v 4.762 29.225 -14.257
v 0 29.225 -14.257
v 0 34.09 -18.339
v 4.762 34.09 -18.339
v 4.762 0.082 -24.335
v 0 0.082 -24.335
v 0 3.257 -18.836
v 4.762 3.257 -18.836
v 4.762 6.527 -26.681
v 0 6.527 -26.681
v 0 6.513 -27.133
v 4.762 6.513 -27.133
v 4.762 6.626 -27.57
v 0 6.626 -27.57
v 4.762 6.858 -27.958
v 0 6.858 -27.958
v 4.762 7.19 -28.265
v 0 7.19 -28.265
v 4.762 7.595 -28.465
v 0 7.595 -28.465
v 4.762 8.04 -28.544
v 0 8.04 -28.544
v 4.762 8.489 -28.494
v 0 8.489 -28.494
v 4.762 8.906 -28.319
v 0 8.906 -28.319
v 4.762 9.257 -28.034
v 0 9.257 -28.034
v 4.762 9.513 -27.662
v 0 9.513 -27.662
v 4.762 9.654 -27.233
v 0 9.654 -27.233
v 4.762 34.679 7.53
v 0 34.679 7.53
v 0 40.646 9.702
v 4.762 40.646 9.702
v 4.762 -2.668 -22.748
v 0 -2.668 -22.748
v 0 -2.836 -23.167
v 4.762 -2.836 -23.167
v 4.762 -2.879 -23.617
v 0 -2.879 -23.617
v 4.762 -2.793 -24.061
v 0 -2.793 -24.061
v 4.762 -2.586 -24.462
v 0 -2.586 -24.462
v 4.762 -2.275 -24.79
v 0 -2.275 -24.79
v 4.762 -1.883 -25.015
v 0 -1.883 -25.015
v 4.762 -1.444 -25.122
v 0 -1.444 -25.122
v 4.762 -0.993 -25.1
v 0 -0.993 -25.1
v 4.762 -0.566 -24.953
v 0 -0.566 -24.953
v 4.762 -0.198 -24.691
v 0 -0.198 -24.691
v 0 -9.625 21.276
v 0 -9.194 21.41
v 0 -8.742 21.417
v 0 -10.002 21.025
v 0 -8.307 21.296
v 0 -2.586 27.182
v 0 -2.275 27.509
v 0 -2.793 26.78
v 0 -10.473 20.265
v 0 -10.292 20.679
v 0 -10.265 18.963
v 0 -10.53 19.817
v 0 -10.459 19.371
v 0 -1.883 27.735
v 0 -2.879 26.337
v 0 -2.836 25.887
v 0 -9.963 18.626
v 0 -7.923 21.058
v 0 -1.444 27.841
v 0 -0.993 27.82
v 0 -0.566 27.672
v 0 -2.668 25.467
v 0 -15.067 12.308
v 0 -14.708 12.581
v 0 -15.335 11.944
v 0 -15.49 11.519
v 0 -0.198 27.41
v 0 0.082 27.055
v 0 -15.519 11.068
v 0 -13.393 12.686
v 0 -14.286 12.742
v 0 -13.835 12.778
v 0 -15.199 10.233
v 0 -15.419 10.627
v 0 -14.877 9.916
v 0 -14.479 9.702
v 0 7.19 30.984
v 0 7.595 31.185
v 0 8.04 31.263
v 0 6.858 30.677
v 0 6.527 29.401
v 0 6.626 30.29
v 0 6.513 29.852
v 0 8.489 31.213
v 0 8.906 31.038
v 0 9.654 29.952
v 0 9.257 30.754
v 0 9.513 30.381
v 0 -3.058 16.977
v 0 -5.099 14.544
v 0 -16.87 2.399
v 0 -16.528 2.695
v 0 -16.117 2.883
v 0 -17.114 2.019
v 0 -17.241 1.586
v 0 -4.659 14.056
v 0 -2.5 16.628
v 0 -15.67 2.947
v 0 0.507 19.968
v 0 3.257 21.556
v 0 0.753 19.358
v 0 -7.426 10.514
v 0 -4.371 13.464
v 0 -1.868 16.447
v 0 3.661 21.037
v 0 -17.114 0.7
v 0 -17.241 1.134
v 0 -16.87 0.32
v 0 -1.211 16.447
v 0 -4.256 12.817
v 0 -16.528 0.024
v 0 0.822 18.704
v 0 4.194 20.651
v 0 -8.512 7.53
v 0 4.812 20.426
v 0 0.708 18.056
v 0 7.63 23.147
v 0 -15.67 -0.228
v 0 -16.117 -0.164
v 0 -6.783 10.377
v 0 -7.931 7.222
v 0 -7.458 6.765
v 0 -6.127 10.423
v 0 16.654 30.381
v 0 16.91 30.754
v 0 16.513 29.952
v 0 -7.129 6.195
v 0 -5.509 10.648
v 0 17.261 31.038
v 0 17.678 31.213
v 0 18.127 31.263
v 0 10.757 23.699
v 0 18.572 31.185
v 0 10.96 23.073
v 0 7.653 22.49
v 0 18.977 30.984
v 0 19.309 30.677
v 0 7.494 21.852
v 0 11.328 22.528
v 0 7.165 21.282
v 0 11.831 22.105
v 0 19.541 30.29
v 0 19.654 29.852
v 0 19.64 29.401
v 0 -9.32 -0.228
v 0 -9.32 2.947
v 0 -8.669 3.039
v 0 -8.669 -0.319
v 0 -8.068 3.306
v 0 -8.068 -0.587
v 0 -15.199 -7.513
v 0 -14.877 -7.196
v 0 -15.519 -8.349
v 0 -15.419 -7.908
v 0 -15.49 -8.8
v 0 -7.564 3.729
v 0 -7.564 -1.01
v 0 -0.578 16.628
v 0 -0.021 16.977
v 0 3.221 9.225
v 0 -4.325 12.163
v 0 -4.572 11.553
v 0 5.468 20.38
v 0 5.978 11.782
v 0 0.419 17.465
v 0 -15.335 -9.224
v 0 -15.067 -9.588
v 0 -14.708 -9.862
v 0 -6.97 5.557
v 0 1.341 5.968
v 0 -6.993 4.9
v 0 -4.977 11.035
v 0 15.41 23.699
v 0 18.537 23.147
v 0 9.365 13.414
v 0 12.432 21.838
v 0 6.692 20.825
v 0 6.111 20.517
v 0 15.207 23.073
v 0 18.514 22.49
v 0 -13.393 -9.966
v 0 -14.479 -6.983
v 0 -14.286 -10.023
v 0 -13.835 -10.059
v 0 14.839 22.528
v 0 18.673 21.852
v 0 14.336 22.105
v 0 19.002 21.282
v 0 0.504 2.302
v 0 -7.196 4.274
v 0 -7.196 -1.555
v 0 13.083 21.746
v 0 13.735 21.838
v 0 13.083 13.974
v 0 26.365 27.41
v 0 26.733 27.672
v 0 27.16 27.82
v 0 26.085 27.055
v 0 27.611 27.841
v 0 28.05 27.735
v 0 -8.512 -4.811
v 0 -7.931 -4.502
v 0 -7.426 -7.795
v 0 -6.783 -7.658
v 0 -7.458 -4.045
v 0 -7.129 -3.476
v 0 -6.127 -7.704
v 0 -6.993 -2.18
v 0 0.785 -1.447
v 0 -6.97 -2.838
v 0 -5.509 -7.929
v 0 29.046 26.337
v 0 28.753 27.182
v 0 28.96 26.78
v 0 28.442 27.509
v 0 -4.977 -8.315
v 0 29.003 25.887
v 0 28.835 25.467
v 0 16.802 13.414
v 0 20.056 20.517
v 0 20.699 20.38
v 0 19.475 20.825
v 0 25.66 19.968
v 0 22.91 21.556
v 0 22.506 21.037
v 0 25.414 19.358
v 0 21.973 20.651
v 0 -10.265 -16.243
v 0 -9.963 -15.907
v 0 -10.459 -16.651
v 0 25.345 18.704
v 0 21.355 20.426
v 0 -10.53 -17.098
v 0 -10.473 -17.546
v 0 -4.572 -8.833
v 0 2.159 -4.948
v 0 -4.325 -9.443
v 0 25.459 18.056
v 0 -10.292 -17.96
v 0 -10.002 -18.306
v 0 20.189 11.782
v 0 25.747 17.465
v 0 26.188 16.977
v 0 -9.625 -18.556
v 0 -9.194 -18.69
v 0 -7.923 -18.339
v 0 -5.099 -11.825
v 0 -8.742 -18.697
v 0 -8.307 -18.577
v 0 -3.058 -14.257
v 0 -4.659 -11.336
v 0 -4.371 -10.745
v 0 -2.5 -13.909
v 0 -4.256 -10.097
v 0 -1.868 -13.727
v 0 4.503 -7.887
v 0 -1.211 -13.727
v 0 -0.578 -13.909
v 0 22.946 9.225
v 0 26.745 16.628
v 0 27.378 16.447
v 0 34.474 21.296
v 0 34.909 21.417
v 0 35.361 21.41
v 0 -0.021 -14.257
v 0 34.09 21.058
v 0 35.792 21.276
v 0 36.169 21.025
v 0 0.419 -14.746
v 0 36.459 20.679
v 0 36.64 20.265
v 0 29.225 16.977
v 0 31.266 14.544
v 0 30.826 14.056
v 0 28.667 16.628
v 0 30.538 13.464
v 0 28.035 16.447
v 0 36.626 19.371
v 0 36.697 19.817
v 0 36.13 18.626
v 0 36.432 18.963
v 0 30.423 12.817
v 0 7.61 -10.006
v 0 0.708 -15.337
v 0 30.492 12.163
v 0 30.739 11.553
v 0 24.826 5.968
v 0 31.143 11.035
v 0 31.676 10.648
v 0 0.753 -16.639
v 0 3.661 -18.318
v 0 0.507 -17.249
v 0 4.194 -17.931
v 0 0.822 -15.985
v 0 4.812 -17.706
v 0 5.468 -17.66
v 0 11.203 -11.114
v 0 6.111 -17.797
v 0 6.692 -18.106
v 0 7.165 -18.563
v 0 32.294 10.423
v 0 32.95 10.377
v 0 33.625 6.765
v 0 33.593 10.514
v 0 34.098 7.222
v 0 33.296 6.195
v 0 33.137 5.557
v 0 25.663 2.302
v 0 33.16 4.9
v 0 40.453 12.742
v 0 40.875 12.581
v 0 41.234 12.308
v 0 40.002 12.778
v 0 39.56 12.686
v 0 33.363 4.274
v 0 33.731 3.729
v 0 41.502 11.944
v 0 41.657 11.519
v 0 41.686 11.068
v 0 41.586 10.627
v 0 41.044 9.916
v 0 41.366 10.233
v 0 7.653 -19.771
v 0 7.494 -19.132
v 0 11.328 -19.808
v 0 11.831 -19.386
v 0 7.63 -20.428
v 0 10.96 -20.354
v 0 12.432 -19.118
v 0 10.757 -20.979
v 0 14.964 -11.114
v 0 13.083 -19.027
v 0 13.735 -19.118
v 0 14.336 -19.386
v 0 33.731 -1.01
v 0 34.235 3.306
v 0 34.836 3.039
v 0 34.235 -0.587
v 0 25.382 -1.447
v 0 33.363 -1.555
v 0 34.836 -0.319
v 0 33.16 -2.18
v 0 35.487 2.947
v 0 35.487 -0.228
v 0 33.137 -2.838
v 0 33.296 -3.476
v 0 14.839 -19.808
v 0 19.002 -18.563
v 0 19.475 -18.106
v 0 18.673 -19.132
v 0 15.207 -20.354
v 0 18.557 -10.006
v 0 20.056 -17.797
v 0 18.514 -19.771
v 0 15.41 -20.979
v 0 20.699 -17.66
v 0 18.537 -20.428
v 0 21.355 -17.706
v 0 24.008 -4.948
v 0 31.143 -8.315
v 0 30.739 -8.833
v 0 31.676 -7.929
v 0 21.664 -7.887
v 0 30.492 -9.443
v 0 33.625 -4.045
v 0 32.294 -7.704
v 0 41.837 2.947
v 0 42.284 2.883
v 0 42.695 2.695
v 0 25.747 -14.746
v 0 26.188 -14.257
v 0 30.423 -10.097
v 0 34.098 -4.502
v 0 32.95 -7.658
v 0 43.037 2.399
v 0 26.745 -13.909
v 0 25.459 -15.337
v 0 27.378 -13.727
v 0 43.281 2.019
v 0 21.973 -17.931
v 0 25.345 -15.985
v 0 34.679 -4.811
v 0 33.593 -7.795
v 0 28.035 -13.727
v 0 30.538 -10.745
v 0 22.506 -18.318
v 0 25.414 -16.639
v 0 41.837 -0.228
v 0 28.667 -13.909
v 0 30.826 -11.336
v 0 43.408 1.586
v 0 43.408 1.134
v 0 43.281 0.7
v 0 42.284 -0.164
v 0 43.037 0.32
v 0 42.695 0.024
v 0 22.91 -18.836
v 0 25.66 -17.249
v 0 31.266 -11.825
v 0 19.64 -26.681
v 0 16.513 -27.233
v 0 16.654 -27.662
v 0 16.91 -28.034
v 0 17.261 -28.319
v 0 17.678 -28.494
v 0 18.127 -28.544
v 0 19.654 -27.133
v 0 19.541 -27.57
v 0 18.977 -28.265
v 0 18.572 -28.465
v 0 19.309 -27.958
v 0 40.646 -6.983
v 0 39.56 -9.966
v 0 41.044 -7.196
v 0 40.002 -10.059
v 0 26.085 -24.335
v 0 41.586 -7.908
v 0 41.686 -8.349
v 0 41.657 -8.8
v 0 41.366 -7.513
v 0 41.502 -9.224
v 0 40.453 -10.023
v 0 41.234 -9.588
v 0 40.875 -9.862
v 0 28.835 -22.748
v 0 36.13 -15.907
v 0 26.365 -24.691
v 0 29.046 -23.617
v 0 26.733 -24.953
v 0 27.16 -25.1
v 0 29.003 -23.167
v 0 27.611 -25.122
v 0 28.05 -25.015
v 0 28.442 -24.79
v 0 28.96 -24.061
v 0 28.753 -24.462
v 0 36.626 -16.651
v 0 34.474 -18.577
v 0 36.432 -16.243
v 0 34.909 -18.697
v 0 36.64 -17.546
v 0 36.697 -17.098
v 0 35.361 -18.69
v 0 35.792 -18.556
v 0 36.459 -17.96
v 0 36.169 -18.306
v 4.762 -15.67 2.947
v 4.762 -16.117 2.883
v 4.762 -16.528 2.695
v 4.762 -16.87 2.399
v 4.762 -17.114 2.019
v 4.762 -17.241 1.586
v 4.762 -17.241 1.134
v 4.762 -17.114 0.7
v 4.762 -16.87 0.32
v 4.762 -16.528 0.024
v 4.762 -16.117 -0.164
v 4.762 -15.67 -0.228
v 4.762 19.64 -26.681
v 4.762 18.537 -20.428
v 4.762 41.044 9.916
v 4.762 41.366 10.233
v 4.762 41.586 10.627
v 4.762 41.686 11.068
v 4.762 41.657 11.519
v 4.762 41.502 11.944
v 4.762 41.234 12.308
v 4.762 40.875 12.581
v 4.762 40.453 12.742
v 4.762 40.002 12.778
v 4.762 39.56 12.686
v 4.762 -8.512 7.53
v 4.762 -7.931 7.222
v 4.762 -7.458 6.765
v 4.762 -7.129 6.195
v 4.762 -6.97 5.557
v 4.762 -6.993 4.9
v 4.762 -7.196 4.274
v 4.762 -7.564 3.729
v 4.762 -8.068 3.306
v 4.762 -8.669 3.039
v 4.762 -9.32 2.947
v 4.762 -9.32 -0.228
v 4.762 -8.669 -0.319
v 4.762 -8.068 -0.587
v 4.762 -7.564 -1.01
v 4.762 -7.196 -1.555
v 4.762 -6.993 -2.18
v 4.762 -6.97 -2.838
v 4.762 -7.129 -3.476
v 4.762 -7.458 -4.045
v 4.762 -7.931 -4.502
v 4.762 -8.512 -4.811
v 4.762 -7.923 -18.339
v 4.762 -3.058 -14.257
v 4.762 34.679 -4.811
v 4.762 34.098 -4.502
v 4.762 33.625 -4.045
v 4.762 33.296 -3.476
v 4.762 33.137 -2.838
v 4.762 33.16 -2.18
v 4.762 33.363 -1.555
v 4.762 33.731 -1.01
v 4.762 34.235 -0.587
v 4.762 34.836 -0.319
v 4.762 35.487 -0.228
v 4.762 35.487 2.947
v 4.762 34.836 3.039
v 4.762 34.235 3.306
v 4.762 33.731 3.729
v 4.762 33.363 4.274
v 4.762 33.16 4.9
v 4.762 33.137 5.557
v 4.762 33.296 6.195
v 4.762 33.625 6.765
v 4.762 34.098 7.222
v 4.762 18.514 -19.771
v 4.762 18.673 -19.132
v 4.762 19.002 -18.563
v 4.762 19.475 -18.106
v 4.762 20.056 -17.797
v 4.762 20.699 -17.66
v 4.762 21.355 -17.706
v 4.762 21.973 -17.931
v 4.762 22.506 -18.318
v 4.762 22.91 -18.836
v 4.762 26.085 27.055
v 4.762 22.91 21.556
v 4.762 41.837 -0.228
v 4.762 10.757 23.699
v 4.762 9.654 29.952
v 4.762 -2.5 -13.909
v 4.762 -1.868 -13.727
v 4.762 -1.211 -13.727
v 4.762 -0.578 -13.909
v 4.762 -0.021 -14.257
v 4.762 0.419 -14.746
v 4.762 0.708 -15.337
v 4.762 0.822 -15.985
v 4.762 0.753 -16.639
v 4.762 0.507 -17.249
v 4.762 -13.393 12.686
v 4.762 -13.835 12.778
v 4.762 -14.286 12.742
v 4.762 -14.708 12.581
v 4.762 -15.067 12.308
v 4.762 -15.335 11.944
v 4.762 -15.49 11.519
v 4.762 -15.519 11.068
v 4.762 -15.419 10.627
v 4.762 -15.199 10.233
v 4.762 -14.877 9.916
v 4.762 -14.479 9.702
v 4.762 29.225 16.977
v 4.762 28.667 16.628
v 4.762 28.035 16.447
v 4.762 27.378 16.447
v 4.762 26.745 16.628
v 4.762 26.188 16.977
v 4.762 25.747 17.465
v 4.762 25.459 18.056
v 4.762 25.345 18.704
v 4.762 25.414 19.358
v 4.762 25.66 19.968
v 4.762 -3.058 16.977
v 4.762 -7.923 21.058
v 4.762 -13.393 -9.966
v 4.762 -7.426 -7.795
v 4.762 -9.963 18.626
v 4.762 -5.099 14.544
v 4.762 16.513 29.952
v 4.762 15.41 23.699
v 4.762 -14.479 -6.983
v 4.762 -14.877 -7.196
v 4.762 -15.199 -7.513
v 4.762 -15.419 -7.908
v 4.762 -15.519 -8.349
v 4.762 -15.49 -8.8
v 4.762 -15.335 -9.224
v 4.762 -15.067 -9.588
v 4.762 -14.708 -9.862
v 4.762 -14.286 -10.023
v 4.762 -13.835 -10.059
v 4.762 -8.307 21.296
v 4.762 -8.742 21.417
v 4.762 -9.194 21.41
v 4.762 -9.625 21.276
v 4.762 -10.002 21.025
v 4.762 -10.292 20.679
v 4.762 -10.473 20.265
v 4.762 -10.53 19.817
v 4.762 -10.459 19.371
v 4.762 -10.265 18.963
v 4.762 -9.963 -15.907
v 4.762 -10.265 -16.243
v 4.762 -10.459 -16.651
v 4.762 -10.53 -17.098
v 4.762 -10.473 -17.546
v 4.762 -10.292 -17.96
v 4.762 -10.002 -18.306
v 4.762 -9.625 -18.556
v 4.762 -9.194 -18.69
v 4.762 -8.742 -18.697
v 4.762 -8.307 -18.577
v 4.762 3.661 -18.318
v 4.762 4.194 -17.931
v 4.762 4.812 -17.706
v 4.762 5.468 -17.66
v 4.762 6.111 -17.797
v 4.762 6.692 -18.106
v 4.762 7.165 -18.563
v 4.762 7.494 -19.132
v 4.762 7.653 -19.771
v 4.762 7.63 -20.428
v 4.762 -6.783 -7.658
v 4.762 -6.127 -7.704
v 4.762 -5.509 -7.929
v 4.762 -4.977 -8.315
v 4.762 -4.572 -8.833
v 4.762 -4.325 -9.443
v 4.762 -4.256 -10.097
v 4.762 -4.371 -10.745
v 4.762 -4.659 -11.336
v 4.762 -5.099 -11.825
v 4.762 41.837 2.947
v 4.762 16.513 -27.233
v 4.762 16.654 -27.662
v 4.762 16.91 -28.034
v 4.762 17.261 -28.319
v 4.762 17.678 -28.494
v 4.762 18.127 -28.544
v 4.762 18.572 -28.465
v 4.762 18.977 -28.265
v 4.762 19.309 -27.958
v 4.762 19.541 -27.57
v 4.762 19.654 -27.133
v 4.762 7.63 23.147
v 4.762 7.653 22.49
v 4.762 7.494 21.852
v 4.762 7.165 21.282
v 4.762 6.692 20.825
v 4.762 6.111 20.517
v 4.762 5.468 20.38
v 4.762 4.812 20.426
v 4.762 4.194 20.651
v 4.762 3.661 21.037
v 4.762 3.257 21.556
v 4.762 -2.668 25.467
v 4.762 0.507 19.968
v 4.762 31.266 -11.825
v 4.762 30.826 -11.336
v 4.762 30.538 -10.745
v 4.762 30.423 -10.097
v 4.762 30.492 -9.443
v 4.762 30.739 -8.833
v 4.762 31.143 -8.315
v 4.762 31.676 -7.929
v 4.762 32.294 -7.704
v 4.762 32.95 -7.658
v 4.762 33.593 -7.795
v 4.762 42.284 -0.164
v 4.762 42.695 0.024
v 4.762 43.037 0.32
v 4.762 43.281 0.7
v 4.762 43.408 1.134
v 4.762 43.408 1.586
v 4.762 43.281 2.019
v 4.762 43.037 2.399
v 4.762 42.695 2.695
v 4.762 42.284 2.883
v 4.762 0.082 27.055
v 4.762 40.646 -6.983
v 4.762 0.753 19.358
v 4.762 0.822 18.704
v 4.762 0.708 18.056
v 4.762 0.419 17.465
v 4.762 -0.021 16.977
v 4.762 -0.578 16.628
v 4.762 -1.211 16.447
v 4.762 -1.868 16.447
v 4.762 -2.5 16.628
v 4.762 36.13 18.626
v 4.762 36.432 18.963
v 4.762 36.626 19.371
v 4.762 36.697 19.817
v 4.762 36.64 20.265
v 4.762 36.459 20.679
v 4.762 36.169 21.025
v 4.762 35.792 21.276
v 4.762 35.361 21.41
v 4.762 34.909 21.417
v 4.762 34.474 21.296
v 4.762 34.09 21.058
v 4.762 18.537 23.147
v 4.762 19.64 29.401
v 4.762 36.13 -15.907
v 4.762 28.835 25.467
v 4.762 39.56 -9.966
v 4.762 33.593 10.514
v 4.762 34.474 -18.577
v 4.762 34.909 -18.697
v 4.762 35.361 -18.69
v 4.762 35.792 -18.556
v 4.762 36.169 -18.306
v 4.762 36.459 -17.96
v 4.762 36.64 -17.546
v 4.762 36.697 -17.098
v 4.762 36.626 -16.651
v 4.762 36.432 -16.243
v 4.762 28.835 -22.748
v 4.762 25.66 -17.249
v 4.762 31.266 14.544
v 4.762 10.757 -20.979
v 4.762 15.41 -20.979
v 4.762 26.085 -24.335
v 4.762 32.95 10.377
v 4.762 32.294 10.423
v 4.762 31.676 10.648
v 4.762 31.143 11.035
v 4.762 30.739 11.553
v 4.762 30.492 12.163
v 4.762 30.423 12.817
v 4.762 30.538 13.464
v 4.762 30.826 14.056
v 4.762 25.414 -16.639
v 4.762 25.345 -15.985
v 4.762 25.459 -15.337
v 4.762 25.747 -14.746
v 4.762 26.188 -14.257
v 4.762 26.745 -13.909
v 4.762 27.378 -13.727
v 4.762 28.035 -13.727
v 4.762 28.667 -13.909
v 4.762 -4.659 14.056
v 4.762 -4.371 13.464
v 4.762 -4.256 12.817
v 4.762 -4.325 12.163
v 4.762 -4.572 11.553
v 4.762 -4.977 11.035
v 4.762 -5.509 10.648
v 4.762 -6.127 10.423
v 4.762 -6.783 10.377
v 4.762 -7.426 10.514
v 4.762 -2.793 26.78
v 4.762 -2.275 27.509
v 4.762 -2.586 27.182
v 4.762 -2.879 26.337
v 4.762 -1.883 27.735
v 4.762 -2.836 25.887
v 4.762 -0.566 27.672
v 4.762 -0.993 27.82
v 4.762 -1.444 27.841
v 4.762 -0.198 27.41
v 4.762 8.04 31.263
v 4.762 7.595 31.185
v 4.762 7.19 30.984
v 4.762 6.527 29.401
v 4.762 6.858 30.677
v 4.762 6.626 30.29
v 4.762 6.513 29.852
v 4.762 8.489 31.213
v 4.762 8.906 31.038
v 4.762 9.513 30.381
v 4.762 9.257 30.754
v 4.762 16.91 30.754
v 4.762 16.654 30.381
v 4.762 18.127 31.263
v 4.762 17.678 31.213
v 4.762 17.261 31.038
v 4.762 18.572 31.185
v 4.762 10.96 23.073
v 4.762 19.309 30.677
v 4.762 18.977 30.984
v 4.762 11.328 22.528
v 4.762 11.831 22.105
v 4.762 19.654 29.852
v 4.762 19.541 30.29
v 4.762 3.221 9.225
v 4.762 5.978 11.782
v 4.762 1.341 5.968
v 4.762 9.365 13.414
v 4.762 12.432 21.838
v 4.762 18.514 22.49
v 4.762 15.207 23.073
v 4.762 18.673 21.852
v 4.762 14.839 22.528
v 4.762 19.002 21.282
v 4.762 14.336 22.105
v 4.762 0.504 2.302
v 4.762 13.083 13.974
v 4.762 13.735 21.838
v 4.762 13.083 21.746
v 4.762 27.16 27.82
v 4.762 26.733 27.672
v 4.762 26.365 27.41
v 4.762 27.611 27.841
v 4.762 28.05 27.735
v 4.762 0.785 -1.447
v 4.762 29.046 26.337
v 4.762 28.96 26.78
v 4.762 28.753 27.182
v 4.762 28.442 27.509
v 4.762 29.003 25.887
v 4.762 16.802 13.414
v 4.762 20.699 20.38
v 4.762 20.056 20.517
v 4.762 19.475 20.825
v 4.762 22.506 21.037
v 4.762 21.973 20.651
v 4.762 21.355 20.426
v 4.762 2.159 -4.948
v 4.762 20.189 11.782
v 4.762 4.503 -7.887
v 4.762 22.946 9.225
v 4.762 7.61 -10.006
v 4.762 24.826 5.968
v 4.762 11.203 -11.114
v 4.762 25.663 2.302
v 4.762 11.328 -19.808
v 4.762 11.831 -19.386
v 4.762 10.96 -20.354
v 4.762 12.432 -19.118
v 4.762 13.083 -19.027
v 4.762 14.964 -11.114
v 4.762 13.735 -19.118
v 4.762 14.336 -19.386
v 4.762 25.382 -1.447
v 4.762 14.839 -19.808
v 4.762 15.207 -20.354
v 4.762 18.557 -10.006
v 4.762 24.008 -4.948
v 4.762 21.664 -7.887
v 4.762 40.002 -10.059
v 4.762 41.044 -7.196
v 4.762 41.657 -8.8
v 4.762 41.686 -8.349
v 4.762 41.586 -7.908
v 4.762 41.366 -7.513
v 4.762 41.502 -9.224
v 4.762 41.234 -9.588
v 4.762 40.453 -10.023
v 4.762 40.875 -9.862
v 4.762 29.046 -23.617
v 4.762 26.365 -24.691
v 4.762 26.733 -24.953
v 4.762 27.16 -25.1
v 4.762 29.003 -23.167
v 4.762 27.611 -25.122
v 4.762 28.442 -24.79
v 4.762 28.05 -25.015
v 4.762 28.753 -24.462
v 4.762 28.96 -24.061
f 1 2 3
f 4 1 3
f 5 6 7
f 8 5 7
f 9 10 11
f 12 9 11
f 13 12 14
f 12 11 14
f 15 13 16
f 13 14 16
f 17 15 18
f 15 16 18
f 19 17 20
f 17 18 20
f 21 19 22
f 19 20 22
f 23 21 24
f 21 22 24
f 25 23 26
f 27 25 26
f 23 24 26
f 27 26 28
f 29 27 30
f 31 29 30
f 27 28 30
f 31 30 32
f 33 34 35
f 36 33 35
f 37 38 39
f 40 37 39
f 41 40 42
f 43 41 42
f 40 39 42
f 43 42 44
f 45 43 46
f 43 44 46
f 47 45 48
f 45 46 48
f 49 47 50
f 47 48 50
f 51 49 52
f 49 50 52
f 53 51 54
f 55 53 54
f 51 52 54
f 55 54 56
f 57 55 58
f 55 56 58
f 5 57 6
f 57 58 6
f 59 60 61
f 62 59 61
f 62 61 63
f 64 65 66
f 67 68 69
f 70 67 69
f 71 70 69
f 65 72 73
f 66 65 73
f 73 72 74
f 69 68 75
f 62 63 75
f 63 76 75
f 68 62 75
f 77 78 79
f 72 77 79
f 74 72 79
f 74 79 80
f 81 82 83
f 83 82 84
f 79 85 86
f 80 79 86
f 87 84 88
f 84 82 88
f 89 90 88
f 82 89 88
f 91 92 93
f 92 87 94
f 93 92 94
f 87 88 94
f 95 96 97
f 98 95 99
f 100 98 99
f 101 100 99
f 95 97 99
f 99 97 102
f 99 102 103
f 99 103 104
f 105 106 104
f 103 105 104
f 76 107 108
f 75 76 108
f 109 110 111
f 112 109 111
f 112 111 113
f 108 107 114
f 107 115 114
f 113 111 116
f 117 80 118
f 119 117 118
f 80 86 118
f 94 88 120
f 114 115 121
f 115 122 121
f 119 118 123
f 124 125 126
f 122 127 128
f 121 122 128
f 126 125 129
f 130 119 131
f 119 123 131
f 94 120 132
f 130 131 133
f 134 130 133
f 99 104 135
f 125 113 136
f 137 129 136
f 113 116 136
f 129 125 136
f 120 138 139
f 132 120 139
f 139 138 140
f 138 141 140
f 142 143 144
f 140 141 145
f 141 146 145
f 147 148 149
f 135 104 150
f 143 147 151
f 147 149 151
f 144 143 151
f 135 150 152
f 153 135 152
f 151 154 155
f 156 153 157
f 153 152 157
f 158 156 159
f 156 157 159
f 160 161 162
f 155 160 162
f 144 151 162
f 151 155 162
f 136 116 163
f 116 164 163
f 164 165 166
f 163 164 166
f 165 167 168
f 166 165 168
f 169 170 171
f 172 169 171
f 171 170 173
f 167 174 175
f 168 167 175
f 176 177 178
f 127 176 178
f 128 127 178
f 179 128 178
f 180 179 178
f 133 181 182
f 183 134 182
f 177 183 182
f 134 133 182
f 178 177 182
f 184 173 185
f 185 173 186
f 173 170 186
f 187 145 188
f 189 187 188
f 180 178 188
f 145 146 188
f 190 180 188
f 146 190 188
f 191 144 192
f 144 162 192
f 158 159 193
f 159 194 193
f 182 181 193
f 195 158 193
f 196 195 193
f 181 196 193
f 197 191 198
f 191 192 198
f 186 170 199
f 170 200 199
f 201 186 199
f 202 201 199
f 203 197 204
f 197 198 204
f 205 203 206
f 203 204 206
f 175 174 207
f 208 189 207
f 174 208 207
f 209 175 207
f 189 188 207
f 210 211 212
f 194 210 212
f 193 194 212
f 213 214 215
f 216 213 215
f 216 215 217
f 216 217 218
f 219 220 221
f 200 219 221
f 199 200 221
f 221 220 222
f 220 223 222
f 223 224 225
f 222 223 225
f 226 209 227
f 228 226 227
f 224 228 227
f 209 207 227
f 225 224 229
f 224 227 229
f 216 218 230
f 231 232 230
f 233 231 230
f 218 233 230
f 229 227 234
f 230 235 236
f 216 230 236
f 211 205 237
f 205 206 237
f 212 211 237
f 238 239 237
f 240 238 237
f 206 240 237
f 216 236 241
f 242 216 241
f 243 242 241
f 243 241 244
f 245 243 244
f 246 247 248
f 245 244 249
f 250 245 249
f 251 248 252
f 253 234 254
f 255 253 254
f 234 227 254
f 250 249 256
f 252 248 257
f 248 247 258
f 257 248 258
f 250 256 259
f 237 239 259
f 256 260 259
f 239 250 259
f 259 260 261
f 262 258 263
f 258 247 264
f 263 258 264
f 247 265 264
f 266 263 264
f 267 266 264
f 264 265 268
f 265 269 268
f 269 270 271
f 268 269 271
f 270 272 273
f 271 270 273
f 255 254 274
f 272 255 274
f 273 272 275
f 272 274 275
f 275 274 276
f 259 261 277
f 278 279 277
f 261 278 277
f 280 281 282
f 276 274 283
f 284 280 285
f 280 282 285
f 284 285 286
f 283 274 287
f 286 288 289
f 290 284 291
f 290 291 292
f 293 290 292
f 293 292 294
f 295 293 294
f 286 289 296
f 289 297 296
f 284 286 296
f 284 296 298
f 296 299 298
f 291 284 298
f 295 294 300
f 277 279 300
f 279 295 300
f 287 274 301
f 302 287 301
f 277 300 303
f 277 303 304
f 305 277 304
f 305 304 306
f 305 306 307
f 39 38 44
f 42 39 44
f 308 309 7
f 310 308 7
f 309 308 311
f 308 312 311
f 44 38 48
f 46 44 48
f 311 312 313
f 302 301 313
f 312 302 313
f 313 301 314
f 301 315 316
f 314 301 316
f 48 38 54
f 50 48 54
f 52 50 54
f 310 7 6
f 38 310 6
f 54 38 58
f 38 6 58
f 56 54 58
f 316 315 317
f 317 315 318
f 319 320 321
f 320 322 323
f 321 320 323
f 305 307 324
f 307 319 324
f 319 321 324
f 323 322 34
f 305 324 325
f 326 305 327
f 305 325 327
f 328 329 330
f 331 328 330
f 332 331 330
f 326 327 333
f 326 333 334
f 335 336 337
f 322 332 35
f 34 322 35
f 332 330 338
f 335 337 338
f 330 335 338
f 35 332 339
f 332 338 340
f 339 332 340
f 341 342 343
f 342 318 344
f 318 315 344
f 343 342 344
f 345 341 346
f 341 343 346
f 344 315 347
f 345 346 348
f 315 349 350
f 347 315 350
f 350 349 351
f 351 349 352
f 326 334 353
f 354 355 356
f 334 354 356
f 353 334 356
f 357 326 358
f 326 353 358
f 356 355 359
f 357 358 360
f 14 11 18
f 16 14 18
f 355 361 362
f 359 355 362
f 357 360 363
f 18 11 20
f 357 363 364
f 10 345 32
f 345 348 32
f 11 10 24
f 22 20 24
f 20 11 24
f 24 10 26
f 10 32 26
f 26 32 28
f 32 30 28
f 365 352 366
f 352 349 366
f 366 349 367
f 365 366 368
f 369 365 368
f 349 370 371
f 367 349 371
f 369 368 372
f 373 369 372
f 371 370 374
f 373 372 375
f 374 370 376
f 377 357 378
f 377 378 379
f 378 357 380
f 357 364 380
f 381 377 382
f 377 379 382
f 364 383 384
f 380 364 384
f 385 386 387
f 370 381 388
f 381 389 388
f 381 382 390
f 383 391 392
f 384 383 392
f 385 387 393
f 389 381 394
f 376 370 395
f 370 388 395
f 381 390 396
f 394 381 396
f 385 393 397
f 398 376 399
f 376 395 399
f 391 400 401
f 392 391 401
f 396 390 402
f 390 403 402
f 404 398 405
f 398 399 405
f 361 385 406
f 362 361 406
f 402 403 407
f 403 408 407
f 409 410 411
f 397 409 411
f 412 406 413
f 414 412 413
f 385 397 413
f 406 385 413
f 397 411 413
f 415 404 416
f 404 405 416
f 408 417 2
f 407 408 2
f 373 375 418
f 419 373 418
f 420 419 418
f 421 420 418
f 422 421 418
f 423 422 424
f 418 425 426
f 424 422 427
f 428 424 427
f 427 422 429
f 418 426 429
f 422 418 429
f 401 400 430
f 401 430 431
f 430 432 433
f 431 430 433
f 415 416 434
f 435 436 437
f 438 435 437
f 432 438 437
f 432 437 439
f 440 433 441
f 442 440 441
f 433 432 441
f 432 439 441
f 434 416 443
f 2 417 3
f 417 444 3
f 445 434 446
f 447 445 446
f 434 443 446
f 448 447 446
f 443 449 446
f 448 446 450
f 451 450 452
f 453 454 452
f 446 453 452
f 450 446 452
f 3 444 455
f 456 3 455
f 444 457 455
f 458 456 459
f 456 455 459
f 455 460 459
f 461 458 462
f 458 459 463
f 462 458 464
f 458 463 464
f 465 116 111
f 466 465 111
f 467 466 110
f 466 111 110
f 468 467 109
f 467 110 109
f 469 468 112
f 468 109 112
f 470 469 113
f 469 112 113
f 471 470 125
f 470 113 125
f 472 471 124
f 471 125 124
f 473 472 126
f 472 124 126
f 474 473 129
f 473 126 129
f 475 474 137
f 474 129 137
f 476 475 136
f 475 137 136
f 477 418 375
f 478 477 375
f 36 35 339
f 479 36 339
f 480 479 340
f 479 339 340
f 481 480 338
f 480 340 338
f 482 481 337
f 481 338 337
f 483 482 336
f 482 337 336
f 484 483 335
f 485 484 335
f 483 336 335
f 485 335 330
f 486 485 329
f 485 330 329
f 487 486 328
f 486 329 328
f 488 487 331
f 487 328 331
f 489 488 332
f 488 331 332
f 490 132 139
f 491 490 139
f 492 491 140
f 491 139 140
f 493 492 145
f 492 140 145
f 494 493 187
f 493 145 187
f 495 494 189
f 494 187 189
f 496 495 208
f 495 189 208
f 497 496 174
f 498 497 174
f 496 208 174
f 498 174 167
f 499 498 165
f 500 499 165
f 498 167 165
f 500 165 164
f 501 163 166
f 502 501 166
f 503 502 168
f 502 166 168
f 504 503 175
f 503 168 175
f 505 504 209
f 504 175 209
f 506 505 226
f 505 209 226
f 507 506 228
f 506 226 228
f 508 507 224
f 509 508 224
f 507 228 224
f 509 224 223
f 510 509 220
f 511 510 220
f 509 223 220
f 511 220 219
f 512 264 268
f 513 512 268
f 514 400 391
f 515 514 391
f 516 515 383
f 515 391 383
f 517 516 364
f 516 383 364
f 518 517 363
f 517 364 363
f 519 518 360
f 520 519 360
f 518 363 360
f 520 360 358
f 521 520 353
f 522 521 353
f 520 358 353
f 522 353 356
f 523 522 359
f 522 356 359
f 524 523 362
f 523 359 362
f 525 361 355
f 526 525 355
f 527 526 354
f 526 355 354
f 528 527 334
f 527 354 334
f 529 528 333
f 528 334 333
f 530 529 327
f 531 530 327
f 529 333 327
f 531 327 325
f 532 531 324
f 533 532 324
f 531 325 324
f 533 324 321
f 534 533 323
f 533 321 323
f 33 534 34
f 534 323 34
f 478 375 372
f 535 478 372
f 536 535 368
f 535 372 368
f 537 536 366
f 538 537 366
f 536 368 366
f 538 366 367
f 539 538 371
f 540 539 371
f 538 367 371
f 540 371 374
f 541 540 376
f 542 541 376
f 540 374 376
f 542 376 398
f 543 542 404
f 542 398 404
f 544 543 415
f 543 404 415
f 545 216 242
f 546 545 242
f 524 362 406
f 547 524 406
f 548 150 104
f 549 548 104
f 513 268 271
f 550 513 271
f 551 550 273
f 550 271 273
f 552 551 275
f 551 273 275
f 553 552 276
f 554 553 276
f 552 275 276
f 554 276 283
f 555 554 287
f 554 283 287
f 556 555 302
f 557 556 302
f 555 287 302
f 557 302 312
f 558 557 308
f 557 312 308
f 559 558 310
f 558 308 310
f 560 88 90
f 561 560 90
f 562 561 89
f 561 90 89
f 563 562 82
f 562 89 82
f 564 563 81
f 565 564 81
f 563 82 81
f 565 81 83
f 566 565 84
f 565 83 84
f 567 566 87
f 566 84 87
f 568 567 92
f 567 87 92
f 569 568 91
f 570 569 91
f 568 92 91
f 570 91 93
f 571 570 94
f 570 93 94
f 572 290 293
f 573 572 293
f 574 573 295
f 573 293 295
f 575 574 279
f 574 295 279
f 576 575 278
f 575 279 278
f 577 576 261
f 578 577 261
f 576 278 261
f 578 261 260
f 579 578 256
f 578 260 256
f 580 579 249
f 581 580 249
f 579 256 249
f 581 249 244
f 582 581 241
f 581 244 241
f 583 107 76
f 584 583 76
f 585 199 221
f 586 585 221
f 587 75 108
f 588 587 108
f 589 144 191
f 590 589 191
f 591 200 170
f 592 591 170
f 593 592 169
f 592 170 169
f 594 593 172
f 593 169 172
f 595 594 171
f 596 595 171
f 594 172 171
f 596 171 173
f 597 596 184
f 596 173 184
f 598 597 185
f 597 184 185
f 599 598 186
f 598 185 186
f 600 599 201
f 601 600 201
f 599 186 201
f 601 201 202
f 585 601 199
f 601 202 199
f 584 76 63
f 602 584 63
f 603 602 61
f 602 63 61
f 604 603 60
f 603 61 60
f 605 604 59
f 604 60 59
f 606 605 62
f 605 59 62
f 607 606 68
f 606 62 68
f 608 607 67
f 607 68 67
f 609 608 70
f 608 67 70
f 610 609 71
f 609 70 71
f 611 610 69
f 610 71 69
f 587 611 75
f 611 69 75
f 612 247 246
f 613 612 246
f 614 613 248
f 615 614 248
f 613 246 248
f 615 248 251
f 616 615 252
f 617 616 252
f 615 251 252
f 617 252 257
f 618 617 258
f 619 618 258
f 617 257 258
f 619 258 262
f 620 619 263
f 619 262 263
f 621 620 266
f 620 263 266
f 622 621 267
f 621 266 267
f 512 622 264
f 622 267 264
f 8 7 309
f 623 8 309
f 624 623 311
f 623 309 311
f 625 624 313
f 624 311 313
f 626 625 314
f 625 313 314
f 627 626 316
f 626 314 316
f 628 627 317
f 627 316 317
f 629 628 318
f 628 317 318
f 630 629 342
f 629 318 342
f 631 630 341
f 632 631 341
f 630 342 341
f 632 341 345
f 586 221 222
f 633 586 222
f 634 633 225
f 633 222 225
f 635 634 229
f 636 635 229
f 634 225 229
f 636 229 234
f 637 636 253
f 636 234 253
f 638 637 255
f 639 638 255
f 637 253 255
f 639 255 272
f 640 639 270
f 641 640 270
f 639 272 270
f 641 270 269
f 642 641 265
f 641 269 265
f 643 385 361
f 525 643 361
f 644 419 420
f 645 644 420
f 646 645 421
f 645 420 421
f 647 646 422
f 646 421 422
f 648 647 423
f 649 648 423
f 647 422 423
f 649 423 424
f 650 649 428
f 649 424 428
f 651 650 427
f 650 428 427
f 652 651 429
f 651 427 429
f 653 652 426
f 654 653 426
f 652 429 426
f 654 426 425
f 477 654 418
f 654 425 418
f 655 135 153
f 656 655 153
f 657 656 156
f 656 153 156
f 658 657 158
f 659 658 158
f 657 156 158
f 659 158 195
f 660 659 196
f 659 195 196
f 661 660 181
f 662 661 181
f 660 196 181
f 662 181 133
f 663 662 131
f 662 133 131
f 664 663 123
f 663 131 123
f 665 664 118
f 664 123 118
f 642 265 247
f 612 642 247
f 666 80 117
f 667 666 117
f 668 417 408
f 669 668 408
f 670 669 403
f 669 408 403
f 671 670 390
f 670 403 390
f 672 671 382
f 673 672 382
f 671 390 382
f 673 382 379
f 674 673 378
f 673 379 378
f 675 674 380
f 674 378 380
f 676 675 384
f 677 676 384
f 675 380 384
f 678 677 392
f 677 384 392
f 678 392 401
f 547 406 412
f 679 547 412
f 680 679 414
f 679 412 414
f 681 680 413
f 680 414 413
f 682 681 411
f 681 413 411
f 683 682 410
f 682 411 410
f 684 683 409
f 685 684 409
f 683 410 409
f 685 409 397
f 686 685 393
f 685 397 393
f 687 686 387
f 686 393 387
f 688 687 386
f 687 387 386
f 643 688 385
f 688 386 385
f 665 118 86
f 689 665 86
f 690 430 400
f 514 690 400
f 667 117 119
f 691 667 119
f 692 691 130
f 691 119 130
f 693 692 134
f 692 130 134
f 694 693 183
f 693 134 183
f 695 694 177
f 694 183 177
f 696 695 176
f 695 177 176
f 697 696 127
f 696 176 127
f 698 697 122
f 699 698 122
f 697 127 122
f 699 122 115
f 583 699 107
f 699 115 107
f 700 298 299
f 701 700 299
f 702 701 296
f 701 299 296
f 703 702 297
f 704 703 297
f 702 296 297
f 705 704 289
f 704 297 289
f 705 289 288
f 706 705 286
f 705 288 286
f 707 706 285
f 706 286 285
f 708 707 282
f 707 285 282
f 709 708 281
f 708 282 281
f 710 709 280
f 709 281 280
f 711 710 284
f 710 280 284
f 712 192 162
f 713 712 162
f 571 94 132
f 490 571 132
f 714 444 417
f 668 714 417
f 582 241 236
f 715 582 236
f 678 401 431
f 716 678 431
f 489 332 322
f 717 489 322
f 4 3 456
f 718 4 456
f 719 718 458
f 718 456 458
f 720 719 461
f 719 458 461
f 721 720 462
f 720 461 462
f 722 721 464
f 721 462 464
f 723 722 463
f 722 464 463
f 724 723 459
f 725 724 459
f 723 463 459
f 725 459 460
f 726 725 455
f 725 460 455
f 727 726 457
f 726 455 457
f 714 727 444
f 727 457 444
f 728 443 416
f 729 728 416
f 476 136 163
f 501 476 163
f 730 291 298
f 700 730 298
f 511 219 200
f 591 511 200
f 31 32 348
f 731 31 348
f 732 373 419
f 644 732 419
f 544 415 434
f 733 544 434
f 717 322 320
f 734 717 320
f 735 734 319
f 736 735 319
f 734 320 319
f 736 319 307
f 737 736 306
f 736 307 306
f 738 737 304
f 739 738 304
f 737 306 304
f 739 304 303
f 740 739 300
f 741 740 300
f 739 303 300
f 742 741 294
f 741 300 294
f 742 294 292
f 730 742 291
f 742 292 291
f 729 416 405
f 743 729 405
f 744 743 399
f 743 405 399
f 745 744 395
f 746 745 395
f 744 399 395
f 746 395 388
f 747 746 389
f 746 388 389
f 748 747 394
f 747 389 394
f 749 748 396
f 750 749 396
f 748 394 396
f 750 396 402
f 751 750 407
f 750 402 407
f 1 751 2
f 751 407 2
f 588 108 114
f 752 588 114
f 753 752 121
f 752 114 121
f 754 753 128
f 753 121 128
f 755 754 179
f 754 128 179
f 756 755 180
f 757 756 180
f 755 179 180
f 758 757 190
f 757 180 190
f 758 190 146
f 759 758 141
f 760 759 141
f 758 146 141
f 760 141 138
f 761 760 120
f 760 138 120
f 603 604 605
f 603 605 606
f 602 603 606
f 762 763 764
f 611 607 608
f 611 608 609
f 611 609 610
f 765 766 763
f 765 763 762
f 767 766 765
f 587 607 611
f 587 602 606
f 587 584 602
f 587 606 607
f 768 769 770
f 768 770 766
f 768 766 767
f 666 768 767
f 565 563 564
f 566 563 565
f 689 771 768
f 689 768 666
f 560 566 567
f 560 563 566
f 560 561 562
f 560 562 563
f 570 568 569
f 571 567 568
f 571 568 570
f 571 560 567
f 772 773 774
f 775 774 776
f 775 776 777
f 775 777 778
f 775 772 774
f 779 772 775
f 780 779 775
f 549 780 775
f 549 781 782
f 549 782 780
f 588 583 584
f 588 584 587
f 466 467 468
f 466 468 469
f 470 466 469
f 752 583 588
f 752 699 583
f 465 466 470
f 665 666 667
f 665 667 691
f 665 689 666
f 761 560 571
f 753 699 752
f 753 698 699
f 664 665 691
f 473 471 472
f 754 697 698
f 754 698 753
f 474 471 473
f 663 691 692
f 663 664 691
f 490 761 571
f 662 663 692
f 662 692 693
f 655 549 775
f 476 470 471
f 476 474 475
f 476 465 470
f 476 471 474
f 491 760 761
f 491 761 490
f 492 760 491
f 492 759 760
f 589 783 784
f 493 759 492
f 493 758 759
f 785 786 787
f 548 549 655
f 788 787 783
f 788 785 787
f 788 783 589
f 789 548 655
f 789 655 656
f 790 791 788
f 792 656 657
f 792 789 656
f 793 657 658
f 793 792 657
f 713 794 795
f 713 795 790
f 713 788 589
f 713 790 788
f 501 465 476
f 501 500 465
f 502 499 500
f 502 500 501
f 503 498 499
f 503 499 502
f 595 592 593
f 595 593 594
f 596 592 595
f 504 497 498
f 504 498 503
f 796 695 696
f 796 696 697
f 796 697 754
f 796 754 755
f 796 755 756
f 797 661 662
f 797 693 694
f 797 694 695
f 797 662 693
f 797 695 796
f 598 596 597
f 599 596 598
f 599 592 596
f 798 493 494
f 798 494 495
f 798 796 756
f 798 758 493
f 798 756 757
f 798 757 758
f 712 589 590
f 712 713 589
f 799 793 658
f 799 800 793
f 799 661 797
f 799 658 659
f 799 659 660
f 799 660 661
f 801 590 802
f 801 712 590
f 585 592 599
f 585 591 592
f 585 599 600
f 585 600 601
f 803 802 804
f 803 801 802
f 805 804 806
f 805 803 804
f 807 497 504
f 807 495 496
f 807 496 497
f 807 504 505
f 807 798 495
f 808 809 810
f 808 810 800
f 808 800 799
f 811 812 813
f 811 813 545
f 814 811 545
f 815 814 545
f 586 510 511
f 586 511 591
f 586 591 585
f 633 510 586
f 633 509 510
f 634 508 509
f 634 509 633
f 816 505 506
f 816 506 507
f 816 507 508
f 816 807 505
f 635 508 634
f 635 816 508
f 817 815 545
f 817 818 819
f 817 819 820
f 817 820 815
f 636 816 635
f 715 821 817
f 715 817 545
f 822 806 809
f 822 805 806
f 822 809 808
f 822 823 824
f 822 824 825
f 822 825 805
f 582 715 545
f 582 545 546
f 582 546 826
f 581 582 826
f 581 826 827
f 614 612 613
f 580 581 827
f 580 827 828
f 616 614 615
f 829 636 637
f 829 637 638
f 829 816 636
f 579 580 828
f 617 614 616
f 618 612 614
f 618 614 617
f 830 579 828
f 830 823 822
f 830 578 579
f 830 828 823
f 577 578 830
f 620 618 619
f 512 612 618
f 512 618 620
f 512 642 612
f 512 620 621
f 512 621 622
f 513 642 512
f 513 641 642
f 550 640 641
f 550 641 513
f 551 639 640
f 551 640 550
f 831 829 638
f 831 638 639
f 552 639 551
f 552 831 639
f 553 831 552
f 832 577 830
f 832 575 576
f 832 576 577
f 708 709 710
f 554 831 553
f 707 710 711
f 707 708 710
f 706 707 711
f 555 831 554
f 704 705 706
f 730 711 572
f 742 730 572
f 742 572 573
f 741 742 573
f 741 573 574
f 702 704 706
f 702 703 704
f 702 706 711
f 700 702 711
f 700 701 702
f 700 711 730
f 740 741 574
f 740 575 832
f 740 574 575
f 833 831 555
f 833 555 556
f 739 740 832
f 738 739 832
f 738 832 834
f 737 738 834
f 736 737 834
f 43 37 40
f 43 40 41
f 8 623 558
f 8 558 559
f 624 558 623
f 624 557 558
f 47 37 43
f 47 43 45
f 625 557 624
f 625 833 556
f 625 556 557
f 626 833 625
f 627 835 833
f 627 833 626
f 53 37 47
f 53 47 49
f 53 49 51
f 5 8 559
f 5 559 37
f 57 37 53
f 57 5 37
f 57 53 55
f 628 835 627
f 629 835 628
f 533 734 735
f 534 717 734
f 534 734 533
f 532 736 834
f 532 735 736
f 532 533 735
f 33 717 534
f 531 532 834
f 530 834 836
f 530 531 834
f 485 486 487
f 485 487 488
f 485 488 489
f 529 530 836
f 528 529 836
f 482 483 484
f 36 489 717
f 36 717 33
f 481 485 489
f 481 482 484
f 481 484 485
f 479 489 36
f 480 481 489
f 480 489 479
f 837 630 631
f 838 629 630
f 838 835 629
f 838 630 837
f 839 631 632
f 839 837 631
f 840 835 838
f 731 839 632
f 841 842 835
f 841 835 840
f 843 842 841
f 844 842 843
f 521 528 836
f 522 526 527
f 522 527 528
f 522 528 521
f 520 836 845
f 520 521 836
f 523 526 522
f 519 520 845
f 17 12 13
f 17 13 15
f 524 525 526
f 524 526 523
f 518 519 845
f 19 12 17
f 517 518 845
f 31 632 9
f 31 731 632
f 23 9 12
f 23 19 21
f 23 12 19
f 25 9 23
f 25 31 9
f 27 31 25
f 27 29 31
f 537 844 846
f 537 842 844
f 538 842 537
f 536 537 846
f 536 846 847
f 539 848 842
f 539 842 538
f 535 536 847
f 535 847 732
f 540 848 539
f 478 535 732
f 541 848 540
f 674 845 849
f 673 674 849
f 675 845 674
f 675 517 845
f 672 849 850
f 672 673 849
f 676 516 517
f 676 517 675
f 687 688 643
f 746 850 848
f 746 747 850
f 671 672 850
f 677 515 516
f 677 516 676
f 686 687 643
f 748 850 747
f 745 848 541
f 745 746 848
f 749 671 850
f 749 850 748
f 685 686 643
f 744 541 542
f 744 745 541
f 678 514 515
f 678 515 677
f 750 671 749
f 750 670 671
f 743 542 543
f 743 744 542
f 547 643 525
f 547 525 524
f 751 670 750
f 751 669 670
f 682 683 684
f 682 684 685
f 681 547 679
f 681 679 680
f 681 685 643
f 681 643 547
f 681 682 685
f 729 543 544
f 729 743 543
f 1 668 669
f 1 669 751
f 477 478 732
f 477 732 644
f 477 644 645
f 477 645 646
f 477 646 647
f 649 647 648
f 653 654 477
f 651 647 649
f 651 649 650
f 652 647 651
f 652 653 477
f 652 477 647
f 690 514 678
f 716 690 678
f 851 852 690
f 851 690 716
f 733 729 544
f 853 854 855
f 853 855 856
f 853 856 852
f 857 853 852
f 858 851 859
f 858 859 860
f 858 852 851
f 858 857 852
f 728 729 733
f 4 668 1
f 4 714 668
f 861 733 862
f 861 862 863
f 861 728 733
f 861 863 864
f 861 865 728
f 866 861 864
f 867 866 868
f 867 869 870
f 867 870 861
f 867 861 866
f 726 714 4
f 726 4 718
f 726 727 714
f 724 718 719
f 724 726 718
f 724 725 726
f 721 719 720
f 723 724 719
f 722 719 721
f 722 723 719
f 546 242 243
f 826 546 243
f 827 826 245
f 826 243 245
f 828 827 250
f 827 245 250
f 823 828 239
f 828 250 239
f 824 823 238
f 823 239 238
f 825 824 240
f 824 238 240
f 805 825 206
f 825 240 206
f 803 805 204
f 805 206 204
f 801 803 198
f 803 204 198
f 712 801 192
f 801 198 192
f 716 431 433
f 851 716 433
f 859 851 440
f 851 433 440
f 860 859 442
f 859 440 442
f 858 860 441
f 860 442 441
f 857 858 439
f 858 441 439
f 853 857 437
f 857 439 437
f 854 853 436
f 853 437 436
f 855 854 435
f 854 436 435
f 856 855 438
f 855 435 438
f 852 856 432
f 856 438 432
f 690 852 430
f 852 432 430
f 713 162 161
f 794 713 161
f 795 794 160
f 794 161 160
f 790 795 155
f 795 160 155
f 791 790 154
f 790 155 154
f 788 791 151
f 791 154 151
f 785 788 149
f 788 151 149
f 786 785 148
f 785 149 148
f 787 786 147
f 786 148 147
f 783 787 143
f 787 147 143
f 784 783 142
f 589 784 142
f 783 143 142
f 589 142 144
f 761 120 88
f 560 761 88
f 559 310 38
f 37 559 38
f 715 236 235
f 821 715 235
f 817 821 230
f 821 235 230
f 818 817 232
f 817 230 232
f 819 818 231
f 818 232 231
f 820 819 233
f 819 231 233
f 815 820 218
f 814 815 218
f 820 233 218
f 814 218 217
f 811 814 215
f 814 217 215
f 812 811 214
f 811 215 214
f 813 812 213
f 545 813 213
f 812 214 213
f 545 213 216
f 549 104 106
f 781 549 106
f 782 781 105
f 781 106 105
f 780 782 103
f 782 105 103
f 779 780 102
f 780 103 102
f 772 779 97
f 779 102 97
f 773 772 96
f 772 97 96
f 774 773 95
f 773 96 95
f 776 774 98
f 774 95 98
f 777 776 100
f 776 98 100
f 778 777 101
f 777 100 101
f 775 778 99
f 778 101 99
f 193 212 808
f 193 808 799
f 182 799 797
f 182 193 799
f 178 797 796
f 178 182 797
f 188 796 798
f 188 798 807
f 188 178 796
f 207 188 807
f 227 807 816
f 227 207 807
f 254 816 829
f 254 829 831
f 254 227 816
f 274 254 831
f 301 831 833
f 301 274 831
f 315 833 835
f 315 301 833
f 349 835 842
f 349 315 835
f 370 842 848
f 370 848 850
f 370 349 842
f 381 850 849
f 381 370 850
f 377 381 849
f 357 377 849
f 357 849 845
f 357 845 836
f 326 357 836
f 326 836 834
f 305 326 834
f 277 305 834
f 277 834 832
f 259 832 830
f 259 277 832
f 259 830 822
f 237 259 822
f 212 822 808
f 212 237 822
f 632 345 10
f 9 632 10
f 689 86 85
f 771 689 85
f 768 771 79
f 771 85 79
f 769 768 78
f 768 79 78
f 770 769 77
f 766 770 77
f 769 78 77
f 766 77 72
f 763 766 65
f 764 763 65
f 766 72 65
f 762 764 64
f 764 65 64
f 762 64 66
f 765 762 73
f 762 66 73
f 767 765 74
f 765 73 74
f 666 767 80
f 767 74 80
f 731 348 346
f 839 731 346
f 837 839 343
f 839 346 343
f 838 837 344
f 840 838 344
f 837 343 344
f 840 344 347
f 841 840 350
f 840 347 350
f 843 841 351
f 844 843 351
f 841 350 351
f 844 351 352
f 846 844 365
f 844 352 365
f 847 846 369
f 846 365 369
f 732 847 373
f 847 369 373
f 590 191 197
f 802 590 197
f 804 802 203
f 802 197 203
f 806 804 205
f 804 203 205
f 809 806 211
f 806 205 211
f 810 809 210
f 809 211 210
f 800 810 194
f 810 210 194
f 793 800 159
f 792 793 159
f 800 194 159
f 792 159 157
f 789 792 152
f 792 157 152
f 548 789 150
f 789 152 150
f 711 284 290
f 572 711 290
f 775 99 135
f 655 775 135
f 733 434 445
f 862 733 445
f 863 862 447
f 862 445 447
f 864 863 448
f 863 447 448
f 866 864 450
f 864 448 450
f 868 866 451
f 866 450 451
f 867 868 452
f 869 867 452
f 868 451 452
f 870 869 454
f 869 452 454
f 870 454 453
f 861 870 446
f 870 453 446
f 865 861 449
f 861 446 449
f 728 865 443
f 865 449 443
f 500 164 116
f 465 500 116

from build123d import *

# Parameters (mm, degrees)
SKETCH1_R           = 12.614459283
BOSS_EXTRUDE1_DEPTH = 4.7625


with BuildPart() as part:
    # Sketch1 → Boss-Extrude1 (new body)
    with BuildSketch(Plane(origin=(0, 0, 0), x_dir=(0, 0, -1), z_dir=(1, 0, 0))):
        with BuildLine():
            Line((6.982856305, 40.645980292), (4.811028394, 34.67893215))
            ThreePointArc((4.811028394, 34.67893215), (2.180363954, 33.160117328), (0.227813255, 35.487076638))
            Line((0.227813255, 35.487076638), (0.227813255, 41.837076638))
            ThreePointArc((0.227813255, 41.837076638), (-1.359686745, 43.424576638), (-2.947186745, 41.837076638))
            Line((-2.947186745, 41.837076638), (-2.947186745, 35.487076638))
            ThreePointArc((-2.947186745, 35.487076638), (-4.899737444, 33.160117328), (-7.530401884, 34.67893215))
            Line((-7.530401884, 34.67893215), (-9.702229795, 40.645980292))
            ThreePointArc((-9.702229795, 40.645980292), (-11.736948808, 41.59478535), (-12.685753866, 39.560066337))
            Line((-12.685753866, 39.560066337), (-10.513925955, 33.593018195))
            ThreePointArc((-10.513925955, 33.593018195), (-11.552856482, 30.738580033), (-14.544337708, 31.266058885))
            Line((-14.544337708, 31.266058885), (-18.62603903, 36.130441099))
            ThreePointArc((-18.62603903, 36.130441099), (-20.862559913, 36.326111322), (-21.058230136, 34.089590438))
            Line((-21.058230136, 34.089590438), (-16.976528815, 29.225208224))
            ThreePointArc((-16.976528815, 29.225208224), (-16.976528815, 26.187578579), (-19.968010041, 25.660099726))
            Line((-19.968010041, 25.660099726), (-25.467271355, 28.835099726))
            ThreePointArc((-25.467271355, 28.835099726), (-27.635836683, 28.254034398), (-27.054771355, 26.085469069))
            Line((-27.054771355, 26.085469069), (-21.555510041, 22.910469069))
            ThreePointArc((-21.555510041, 22.910469069), (-20.516579514, 20.056030907), (-23.147243954, 18.537216084))
            Line((-23.147243954, 18.537216084), (-29.400773186, 19.639882012))
            ThreePointArc((-29.400773186, 19.639882012), (-31.239821976, 18.352166186), (-29.95210615, 16.513117396))
            Line((-29.95210615, 16.513117396), (-23.698576918, 15.410451468))
            ThreePointArc((-23.698576918, 15.410451468), (-21.746026219, 13.083492158), (-23.698576918, 10.756532847))
            Line((-23.698576918, 10.756532847), (-29.95210615, 9.653866919))
            ThreePointArc((-29.95210615, 9.653866919), (-31.239821976, 7.814818129), (-29.400773186, 6.527102303))
            Line((-29.400773186, 6.527102303), (-23.147243954, 7.629768232))
            ThreePointArc((-23.147243954, 7.629768232), (-20.516579514, 6.110953409), (-21.555510041, 3.256515246))
            Line((-21.555510041, 3.256515246), (-27.054771355, 0.081515246))
            ThreePointArc((-27.054771355, 0.081515246), (-27.635836683, -2.087050082), (-25.467271355, -2.668115411))
            Line((-25.467271355, -2.668115411), (-19.968010041, 0.506884589))
            ThreePointArc((-19.968010041, 0.506884589), (-16.976528815, -0.020594263), (-16.976528815, -3.058223909))
            Line((-16.976528815, -3.058223909), (-21.058230136, -7.922606123))
            ThreePointArc((-21.058230136, -7.922606123), (-20.862559913, -10.159127007), (-18.62603903, -9.963456784))
            Line((-18.62603903, -9.963456784), (-14.544337708, -5.09907457))
            ThreePointArc((-14.544337708, -5.09907457), (-11.552856482, -4.571595717), (-10.513925955, -7.42603388))
            Line((-10.513925955, -7.42603388), (-12.685753866, -13.393082022))
            ThreePointArc((-12.685753866, -13.393082022), (-11.736948808, -15.427801035), (-9.702229795, -14.478995977))
            Line((-9.702229795, -14.478995977), (-7.530401884, -8.511947835))
            ThreePointArc((-7.530401884, -8.511947835), (-4.899737444, -6.993133012), (-2.947186745, -9.320092323))
            Line((-2.947186745, -9.320092323), (-2.947186745, -15.670092323))
            ThreePointArc((-2.947186745, -15.670092323), (-1.359686745, -17.257592323), (0.227813255, -15.670092323))
            Line((0.227813255, -15.670092323), (0.227813255, -9.320092323))
            ThreePointArc((0.227813255, -9.320092323), (2.180363954, -6.993133012), (4.811028394, -8.511947835))
            Line((4.811028394, -8.511947835), (6.982856305, -14.478995977))
            ThreePointArc((6.982856305, -14.478995977), (9.017575318, -15.427801035), (9.966380376, -13.393082022))
            Line((9.966380376, -13.393082022), (7.794552465, -7.42603388))
            ThreePointArc((7.794552465, -7.42603388), (8.833482992, -4.571595717), (11.824964218, -5.09907457))
            Line((11.824964218, -5.09907457), (15.90666554, -9.963456784))
            ThreePointArc((15.90666554, -9.963456784), (18.143186423, -10.159127007), (18.338856646, -7.922606123))
            Line((18.338856646, -7.922606123), (14.257155325, -3.058223909))
            ThreePointArc((14.257155325, -3.058223909), (14.257155325, -0.020594263), (17.248636551, 0.506884589))
            Line((17.248636551, 0.506884589), (22.747897865, -2.668115411))
            ThreePointArc((22.747897865, -2.668115411), (24.916463193, -2.087050082), (24.335397865, 0.081515246))
            Line((24.335397865, 0.081515246), (18.836136551, 3.256515246))
            ThreePointArc((18.836136551, 3.256515246), (17.797206024, 6.110953409), (20.427870464, 7.629768232))
            Line((20.427870464, 7.629768232), (26.681399696, 6.527102303))
            ThreePointArc((26.681399696, 6.527102303), (28.520448486, 7.814818129), (27.23273266, 9.653866919))
            Line((27.23273266, 9.653866919), (20.979203428, 10.756532847))
            ThreePointArc((20.979203428, 10.756532847), (19.026652729, 13.083492158), (20.979203428, 15.410451468))
            Line((20.979203428, 15.410451468), (27.23273266, 16.513117396))
            ThreePointArc((27.23273266, 16.513117396), (28.520448486, 18.352166186), (26.681399696, 19.639882012))
            Line((26.681399696, 19.639882012), (20.427870464, 18.537216084))
            ThreePointArc((20.427870464, 18.537216084), (17.797206024, 20.056030907), (18.836136551, 22.910469069))
            Line((18.836136551, 22.910469069), (24.335397865, 26.085469069))
            ThreePointArc((24.335397865, 26.085469069), (24.916463193, 28.254034398), (22.747897865, 28.835099726))
            Line((22.747897865, 28.835099726), (17.248636551, 25.660099726))
            ThreePointArc((17.248636551, 25.660099726), (14.257155325, 26.187578579), (14.257155325, 29.225208224))
            Line((14.257155325, 29.225208224), (18.338856646, 34.089590438))
            ThreePointArc((18.338856646, 34.089590438), (18.143186423, 36.326111322), (15.90666554, 36.130441099))
            Line((15.90666554, 36.130441099), (11.824964218, 31.266058885))
            ThreePointArc((11.824964218, 31.266058885), (8.833482992, 30.738580033), (7.794552465, 33.593018195))
            Line((7.794552465, 33.593018195), (9.966380376, 39.560066337))
            ThreePointArc((9.966380376, 39.560066337), (9.017575318, 41.59478535), (6.982856305, 40.645980292))
        make_face()
        with Locations(Location((-1.359686745, 13.083492158, 0), (0, 0, 180))):
            Circle(SKETCH1_R, mode=Mode.SUBTRACT)
    extrude(amount=BOSS_EXTRUDE1_DEPTH)


solid = part.part
